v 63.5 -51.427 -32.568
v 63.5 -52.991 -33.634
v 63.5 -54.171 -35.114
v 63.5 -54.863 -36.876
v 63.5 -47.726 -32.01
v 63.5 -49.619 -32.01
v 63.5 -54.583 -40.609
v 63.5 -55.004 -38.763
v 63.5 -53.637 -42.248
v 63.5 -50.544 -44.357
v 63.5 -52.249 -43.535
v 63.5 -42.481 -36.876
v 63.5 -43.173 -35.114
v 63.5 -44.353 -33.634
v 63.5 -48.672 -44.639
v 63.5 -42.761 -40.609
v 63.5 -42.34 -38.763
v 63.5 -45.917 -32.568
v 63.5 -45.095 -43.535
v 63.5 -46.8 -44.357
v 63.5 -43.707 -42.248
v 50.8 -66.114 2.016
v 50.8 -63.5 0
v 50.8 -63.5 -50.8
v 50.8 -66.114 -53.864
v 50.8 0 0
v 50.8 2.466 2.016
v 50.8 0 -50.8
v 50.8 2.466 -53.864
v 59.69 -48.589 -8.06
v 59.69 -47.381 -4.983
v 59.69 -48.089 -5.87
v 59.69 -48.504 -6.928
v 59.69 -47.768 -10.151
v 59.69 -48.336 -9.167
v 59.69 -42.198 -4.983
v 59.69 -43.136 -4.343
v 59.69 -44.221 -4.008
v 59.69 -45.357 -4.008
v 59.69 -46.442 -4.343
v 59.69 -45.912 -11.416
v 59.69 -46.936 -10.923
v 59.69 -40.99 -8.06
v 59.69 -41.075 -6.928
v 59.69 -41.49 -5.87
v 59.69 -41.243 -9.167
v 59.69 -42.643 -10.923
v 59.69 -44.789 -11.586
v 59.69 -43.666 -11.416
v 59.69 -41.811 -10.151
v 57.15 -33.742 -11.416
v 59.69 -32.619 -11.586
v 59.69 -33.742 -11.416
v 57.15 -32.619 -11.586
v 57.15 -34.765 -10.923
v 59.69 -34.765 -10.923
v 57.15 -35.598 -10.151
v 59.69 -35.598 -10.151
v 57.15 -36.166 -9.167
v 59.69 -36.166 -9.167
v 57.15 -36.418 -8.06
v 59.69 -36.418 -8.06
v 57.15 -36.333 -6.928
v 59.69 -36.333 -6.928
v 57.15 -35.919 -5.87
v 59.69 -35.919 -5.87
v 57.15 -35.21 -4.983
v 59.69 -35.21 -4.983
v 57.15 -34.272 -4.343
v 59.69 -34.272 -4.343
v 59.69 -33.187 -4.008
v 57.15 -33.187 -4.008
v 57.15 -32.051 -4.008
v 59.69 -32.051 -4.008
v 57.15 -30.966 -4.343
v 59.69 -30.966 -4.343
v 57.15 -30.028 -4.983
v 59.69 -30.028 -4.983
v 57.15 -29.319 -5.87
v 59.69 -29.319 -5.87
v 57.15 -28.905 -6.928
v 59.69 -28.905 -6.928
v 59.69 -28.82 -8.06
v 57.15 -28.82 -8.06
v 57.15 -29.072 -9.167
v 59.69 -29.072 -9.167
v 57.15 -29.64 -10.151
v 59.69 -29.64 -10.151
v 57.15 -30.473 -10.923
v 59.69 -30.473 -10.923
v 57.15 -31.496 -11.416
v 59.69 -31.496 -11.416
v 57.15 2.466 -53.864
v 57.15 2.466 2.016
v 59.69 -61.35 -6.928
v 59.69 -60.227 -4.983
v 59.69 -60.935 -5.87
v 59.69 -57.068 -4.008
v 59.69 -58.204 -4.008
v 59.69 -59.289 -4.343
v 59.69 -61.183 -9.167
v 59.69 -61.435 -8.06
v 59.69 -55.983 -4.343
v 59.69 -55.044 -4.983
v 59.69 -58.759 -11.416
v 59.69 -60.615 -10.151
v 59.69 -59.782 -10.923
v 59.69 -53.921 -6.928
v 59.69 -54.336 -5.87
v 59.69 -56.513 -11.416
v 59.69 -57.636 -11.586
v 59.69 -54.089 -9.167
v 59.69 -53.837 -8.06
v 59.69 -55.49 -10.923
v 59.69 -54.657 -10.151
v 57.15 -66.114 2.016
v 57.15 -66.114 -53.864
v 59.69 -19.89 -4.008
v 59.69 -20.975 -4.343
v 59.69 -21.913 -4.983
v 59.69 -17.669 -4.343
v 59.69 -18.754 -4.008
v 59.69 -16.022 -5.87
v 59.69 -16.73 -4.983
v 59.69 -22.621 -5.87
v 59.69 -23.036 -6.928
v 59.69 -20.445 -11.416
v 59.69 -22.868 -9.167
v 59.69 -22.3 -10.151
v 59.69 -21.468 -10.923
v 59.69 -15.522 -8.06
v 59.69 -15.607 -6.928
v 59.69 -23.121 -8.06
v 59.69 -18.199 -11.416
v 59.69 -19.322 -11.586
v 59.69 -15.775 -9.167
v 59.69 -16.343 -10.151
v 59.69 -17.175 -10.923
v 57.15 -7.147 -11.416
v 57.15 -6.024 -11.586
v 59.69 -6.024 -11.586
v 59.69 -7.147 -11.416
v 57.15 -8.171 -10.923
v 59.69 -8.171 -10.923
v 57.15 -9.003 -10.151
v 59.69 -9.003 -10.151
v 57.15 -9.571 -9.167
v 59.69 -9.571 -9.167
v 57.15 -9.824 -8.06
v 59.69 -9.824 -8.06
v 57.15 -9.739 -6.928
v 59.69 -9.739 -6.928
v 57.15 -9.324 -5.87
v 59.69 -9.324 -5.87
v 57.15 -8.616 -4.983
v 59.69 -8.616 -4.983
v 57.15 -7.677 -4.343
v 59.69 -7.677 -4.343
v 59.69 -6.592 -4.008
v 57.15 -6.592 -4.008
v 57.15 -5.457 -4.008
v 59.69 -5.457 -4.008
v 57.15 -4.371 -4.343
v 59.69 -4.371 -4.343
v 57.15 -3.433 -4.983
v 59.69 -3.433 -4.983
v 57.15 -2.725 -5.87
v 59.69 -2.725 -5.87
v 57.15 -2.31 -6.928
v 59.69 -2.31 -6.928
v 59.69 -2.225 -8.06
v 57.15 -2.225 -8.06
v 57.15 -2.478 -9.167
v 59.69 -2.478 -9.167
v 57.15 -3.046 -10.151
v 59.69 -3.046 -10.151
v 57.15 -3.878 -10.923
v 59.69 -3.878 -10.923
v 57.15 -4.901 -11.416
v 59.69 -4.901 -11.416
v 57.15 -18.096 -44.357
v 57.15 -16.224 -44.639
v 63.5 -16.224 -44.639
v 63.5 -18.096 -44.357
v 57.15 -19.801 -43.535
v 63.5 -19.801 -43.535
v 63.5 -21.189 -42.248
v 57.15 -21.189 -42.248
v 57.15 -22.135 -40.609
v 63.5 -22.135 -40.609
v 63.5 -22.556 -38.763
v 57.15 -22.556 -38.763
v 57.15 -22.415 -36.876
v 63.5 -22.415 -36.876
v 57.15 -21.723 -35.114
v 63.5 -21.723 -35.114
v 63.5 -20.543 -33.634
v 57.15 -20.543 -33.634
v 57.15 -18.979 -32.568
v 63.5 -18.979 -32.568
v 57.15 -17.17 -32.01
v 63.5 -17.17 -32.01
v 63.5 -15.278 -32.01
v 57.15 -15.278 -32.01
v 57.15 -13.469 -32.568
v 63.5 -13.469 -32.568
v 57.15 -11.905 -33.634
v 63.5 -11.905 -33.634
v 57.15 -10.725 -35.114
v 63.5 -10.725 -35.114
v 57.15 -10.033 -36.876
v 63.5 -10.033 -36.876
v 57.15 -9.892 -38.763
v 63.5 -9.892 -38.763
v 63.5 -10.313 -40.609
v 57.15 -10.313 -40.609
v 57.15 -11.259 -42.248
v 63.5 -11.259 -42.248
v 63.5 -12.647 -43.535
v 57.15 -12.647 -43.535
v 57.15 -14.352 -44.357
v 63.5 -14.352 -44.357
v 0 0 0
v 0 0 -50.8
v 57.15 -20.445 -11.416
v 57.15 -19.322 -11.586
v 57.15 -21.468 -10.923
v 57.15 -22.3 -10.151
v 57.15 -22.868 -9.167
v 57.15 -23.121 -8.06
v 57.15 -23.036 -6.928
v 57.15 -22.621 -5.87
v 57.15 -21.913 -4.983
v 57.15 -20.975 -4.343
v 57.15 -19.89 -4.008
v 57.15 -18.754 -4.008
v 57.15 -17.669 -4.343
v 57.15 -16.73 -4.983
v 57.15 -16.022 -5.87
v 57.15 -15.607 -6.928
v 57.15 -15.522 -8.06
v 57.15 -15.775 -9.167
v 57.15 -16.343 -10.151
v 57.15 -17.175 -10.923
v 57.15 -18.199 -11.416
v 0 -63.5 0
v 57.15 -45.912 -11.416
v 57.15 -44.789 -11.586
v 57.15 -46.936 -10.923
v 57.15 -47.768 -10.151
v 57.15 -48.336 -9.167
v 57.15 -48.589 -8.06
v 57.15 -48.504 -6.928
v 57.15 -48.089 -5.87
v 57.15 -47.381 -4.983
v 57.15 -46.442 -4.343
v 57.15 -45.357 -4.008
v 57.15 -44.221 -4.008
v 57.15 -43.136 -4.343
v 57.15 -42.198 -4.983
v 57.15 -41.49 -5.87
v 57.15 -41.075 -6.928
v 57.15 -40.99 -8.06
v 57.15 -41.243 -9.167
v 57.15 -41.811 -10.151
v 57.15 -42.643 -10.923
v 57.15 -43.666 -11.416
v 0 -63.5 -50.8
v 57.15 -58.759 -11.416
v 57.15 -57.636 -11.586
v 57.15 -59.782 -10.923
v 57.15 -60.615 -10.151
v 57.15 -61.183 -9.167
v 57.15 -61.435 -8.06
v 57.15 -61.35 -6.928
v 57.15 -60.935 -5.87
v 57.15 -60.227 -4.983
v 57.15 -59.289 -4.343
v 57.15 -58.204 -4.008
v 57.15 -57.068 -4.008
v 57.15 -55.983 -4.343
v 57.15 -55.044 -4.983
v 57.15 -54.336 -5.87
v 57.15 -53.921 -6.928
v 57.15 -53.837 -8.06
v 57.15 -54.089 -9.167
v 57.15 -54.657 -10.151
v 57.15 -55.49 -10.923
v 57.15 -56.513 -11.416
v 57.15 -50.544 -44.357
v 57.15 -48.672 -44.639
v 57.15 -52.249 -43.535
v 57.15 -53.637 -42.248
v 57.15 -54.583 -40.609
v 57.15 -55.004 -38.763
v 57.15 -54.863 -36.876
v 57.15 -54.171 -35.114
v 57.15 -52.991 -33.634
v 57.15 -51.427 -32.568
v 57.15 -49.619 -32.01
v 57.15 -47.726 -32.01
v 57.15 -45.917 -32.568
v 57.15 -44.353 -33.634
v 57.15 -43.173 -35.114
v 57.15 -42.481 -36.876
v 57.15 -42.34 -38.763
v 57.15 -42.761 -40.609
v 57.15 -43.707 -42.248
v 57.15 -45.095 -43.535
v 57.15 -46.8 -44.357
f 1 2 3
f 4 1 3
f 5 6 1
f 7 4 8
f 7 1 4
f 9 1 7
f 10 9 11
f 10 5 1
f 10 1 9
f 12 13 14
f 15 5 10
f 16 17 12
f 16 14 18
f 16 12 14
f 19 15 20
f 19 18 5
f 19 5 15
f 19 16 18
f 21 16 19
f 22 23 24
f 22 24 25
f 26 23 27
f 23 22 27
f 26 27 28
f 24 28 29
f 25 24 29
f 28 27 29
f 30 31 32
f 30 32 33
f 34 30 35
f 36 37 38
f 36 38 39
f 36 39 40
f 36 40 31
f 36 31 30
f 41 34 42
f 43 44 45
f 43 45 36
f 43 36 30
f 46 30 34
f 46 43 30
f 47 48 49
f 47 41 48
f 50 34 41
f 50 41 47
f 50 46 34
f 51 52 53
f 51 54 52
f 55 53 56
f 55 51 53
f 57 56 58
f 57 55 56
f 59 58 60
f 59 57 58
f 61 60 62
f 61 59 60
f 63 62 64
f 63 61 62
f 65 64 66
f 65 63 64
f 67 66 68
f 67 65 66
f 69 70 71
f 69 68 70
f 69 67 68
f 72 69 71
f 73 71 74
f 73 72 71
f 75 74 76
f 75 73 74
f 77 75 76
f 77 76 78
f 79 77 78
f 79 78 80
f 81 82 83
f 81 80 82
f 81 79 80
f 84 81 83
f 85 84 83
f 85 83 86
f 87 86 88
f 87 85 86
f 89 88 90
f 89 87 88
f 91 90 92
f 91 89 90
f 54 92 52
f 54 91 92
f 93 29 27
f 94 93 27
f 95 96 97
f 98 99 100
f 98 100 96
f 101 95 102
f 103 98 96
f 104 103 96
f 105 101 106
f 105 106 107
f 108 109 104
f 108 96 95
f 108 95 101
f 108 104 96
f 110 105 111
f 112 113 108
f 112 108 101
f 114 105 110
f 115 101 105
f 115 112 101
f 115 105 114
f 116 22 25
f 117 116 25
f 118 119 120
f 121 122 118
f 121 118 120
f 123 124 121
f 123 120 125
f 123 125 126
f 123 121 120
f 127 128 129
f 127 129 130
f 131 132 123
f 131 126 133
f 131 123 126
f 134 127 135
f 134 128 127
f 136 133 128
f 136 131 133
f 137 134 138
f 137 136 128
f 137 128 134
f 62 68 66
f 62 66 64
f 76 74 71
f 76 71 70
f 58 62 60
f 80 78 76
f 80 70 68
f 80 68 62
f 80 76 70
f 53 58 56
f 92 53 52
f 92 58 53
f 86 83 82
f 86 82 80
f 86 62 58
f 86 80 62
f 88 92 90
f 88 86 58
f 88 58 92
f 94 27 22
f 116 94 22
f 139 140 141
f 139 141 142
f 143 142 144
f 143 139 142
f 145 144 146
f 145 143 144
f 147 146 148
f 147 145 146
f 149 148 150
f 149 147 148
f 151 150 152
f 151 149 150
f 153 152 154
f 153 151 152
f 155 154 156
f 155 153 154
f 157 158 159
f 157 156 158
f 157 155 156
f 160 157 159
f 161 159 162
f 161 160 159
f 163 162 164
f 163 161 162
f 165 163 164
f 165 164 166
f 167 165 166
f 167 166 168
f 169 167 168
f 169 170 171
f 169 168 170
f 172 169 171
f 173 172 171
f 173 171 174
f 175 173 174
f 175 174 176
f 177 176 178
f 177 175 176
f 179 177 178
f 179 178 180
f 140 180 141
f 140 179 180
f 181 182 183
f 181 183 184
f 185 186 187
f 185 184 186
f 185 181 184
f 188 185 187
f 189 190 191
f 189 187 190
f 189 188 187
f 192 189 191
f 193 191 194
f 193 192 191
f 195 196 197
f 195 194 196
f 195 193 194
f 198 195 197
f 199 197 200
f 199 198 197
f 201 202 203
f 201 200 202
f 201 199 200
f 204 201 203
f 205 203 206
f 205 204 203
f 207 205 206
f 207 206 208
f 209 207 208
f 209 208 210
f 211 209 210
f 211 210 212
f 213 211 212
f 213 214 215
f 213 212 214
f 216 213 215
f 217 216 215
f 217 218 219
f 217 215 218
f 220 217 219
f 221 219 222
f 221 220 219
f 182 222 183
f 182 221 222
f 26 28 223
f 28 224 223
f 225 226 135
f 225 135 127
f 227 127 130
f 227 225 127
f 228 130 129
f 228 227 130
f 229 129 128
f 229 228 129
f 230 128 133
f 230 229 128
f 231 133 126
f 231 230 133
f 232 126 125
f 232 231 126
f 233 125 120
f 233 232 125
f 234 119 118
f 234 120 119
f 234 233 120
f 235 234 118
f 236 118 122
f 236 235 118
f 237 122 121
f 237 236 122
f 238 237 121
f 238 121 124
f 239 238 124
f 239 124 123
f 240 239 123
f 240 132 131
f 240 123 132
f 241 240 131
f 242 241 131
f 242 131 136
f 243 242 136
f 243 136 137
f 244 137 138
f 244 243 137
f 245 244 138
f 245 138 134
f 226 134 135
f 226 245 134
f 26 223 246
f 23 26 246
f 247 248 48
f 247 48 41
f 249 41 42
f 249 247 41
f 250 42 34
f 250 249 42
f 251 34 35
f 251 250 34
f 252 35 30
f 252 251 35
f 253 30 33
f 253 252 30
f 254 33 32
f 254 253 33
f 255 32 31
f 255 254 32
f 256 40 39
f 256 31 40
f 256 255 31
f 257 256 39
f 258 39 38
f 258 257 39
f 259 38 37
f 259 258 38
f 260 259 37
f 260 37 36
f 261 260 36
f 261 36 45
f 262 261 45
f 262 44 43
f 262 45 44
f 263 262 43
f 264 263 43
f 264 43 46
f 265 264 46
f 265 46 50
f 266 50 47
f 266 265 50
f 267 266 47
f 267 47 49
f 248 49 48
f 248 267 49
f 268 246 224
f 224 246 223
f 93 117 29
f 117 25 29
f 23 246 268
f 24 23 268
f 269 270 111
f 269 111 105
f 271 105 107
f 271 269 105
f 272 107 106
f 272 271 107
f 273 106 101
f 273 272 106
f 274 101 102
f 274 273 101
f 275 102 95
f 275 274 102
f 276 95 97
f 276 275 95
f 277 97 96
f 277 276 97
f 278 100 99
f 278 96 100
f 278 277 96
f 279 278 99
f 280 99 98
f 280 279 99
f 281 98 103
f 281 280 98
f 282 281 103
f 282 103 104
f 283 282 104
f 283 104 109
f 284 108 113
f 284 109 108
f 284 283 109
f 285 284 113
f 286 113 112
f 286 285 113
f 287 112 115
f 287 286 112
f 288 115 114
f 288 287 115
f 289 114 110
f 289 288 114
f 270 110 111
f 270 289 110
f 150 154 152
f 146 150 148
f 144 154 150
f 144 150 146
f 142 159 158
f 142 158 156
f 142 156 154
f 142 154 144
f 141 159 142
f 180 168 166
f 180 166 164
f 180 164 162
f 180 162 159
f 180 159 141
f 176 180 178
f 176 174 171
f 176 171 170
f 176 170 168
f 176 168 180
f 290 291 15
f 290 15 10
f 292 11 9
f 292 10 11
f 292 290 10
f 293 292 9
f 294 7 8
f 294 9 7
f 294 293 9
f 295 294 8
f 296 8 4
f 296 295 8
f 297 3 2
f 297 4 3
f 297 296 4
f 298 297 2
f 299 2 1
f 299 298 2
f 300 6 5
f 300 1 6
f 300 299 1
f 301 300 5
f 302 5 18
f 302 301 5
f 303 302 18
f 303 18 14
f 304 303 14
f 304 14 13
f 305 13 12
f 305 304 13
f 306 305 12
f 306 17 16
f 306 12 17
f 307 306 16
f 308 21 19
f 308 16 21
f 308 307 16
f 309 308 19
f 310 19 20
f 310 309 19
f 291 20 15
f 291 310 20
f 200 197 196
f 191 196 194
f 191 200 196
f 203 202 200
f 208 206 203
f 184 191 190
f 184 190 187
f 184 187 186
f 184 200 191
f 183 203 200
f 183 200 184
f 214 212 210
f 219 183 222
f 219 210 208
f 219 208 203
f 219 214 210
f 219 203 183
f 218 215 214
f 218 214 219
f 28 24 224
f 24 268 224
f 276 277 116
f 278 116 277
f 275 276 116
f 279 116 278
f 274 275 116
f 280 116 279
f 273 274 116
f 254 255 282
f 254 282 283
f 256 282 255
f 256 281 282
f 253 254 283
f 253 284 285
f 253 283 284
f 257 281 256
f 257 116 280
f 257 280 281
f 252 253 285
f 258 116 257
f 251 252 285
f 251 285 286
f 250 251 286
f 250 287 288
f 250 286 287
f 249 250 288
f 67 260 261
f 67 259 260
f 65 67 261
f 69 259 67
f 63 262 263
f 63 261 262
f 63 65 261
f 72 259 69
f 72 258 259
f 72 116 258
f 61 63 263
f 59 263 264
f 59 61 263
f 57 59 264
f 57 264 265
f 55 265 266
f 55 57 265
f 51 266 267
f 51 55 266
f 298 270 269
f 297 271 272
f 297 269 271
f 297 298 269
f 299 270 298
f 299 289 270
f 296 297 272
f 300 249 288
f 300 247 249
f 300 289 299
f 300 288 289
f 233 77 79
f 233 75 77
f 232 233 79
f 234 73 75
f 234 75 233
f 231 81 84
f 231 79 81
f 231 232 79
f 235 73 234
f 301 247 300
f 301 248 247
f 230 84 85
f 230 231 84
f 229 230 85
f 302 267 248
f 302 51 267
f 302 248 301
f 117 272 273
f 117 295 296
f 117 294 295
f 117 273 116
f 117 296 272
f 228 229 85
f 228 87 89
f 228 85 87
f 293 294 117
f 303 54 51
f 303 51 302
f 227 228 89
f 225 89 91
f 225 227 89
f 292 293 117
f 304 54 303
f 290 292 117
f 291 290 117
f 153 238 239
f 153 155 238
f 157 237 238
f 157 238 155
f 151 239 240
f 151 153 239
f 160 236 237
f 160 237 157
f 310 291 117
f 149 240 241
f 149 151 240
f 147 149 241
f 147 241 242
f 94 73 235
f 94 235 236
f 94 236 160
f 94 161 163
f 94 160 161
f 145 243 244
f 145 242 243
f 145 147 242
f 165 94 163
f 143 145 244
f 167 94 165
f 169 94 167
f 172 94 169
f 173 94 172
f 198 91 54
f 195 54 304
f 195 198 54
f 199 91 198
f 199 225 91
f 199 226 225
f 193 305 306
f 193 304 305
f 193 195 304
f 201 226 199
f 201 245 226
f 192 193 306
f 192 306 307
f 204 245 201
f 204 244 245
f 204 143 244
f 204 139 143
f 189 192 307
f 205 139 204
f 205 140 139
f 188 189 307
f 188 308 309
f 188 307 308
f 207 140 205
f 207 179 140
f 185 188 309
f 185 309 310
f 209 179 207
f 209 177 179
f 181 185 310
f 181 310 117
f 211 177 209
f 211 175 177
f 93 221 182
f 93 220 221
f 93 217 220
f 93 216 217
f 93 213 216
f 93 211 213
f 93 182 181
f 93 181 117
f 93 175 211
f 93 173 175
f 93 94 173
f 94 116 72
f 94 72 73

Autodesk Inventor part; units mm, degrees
ref_plane "YZ Plane" through (0, 0, 0) normal (1, 0, 0) x (0, 1, 0)
ref_plane "XZ Plane" through (0, 0, 0) normal (0, 1, 0) x (-1, 0, 0)
ref_plane "XY Plane" through (0, 0, 0) normal (0, 0, 1) x (1, 0, 0)
sketch "Sketch1" plane through (0, 0, 0) normal (1, 0, 0) x (0, 1, 0)
  line L0 (0, 0) -> (-63.5, 0)
  line L1 (-63.5, 0) -> (-63.5, -50.8)
  line L2 (-63.5, -50.8) -> (0, -50.8)
  line L3 (0, -50.8) -> (0, 0)
  dimension "d0" = 63.5
  dimension "d1" = 50.8
extrude "Extrusion1" add sketch "Sketch1" along normal blind 50.8
sketch "Sketch2" plane through (50.8, 0, 0) normal (1, 0, 0) x (0, 0, -1)
  line L0 (53.8638, 2.4661) -> (-2.0162, 2.4661)
  line L1 (-2.0162, 2.4661) -> (-2.0162, -66.1139)
  line L2 (-2.0162, -66.1139) -> (53.8638, -66.1139)
  line L3 (53.8638, -66.1139) -> (53.8638, 2.4661)
  point P0 (0, 0)
  dimension "d4" = 55.88
  dimension "d5" = 68.58
extrude "Extrusion2" add sketch "Sketch2" along normal blind 6.35
sketch "Sketch3" plane through (57.15, 0, 0) normal (1, 0, 0) x (0, 0, -1)
  circle A0 centre (38.2887, -16.224) radius 6.35
  circle A1 centre (38.2887, -48.6721) radius 6.35
  circle A2 centre (6.879, -6.1002) radius 3.81
  circle A3 centre (6.879, -18.8199) radius 3.81
  circle A4 centre (6.879, -34.395) radius 3.81
  circle A5 centre (6.879, -46.5954) radius 3.81
  circle A6 centre (6.879, -58.7959) radius 3.81
  point P0 (0, 0)
  dimension "d8" = 12.7
  dimension "d9" = 12.7
  dimension "d10" = 7.62
  dimension "d11" = 7.62
  dimension "d12" = 7.62
  dimension "d13" = 7.62
  dimension "d14" = 7.62
extrude "Extrusion3" add sketch "Sketch3" along normal blind 6.35 contours A0 | A1
sketch "Sketch4" plane through (57.15, 0, 0) normal (1, 0, 0) x (0, 0, -1)
  circle A0 centre (7.7755, -6.0244) radius 3.81
  circle A1 centre (7.7755, -19.3217) radius 3.81
  circle A2 centre (7.7755, -32.619) radius 3.81
  circle A3 centre (7.7755, -44.7893) radius 3.81
  circle A4 centre (7.7755, -57.6359) radius 3.81
  point P0 (0, 0)
  dimension "d17" = 7.62
  dimension "d18" = 7.62
  dimension "d19" = 7.62
  dimension "d20" = 7.62
  dimension "d21" = 7.62
extrude "Extrusion4" add sketch "Sketch4" along normal blind 2.54
sketch "Sketch5" plane through (57.15, 0, 0) normal (1, 0, 0) x (0, 0, -1)
  point P0 (0, 0)
sketch "Sketch6" plane through (57.15, 0, 0) normal (1, 0, 0) x (0, 0, -1)
  circle A0 centre (38.3083, -15.968) radius 3.175
  circle A1 centre (38.3083, -48.6538) radius 3.175
  point P0 (0, 0)
  dimension "d24" = 6.35
  dimension "d25" = 6.35
properties part number "Battery 2"
